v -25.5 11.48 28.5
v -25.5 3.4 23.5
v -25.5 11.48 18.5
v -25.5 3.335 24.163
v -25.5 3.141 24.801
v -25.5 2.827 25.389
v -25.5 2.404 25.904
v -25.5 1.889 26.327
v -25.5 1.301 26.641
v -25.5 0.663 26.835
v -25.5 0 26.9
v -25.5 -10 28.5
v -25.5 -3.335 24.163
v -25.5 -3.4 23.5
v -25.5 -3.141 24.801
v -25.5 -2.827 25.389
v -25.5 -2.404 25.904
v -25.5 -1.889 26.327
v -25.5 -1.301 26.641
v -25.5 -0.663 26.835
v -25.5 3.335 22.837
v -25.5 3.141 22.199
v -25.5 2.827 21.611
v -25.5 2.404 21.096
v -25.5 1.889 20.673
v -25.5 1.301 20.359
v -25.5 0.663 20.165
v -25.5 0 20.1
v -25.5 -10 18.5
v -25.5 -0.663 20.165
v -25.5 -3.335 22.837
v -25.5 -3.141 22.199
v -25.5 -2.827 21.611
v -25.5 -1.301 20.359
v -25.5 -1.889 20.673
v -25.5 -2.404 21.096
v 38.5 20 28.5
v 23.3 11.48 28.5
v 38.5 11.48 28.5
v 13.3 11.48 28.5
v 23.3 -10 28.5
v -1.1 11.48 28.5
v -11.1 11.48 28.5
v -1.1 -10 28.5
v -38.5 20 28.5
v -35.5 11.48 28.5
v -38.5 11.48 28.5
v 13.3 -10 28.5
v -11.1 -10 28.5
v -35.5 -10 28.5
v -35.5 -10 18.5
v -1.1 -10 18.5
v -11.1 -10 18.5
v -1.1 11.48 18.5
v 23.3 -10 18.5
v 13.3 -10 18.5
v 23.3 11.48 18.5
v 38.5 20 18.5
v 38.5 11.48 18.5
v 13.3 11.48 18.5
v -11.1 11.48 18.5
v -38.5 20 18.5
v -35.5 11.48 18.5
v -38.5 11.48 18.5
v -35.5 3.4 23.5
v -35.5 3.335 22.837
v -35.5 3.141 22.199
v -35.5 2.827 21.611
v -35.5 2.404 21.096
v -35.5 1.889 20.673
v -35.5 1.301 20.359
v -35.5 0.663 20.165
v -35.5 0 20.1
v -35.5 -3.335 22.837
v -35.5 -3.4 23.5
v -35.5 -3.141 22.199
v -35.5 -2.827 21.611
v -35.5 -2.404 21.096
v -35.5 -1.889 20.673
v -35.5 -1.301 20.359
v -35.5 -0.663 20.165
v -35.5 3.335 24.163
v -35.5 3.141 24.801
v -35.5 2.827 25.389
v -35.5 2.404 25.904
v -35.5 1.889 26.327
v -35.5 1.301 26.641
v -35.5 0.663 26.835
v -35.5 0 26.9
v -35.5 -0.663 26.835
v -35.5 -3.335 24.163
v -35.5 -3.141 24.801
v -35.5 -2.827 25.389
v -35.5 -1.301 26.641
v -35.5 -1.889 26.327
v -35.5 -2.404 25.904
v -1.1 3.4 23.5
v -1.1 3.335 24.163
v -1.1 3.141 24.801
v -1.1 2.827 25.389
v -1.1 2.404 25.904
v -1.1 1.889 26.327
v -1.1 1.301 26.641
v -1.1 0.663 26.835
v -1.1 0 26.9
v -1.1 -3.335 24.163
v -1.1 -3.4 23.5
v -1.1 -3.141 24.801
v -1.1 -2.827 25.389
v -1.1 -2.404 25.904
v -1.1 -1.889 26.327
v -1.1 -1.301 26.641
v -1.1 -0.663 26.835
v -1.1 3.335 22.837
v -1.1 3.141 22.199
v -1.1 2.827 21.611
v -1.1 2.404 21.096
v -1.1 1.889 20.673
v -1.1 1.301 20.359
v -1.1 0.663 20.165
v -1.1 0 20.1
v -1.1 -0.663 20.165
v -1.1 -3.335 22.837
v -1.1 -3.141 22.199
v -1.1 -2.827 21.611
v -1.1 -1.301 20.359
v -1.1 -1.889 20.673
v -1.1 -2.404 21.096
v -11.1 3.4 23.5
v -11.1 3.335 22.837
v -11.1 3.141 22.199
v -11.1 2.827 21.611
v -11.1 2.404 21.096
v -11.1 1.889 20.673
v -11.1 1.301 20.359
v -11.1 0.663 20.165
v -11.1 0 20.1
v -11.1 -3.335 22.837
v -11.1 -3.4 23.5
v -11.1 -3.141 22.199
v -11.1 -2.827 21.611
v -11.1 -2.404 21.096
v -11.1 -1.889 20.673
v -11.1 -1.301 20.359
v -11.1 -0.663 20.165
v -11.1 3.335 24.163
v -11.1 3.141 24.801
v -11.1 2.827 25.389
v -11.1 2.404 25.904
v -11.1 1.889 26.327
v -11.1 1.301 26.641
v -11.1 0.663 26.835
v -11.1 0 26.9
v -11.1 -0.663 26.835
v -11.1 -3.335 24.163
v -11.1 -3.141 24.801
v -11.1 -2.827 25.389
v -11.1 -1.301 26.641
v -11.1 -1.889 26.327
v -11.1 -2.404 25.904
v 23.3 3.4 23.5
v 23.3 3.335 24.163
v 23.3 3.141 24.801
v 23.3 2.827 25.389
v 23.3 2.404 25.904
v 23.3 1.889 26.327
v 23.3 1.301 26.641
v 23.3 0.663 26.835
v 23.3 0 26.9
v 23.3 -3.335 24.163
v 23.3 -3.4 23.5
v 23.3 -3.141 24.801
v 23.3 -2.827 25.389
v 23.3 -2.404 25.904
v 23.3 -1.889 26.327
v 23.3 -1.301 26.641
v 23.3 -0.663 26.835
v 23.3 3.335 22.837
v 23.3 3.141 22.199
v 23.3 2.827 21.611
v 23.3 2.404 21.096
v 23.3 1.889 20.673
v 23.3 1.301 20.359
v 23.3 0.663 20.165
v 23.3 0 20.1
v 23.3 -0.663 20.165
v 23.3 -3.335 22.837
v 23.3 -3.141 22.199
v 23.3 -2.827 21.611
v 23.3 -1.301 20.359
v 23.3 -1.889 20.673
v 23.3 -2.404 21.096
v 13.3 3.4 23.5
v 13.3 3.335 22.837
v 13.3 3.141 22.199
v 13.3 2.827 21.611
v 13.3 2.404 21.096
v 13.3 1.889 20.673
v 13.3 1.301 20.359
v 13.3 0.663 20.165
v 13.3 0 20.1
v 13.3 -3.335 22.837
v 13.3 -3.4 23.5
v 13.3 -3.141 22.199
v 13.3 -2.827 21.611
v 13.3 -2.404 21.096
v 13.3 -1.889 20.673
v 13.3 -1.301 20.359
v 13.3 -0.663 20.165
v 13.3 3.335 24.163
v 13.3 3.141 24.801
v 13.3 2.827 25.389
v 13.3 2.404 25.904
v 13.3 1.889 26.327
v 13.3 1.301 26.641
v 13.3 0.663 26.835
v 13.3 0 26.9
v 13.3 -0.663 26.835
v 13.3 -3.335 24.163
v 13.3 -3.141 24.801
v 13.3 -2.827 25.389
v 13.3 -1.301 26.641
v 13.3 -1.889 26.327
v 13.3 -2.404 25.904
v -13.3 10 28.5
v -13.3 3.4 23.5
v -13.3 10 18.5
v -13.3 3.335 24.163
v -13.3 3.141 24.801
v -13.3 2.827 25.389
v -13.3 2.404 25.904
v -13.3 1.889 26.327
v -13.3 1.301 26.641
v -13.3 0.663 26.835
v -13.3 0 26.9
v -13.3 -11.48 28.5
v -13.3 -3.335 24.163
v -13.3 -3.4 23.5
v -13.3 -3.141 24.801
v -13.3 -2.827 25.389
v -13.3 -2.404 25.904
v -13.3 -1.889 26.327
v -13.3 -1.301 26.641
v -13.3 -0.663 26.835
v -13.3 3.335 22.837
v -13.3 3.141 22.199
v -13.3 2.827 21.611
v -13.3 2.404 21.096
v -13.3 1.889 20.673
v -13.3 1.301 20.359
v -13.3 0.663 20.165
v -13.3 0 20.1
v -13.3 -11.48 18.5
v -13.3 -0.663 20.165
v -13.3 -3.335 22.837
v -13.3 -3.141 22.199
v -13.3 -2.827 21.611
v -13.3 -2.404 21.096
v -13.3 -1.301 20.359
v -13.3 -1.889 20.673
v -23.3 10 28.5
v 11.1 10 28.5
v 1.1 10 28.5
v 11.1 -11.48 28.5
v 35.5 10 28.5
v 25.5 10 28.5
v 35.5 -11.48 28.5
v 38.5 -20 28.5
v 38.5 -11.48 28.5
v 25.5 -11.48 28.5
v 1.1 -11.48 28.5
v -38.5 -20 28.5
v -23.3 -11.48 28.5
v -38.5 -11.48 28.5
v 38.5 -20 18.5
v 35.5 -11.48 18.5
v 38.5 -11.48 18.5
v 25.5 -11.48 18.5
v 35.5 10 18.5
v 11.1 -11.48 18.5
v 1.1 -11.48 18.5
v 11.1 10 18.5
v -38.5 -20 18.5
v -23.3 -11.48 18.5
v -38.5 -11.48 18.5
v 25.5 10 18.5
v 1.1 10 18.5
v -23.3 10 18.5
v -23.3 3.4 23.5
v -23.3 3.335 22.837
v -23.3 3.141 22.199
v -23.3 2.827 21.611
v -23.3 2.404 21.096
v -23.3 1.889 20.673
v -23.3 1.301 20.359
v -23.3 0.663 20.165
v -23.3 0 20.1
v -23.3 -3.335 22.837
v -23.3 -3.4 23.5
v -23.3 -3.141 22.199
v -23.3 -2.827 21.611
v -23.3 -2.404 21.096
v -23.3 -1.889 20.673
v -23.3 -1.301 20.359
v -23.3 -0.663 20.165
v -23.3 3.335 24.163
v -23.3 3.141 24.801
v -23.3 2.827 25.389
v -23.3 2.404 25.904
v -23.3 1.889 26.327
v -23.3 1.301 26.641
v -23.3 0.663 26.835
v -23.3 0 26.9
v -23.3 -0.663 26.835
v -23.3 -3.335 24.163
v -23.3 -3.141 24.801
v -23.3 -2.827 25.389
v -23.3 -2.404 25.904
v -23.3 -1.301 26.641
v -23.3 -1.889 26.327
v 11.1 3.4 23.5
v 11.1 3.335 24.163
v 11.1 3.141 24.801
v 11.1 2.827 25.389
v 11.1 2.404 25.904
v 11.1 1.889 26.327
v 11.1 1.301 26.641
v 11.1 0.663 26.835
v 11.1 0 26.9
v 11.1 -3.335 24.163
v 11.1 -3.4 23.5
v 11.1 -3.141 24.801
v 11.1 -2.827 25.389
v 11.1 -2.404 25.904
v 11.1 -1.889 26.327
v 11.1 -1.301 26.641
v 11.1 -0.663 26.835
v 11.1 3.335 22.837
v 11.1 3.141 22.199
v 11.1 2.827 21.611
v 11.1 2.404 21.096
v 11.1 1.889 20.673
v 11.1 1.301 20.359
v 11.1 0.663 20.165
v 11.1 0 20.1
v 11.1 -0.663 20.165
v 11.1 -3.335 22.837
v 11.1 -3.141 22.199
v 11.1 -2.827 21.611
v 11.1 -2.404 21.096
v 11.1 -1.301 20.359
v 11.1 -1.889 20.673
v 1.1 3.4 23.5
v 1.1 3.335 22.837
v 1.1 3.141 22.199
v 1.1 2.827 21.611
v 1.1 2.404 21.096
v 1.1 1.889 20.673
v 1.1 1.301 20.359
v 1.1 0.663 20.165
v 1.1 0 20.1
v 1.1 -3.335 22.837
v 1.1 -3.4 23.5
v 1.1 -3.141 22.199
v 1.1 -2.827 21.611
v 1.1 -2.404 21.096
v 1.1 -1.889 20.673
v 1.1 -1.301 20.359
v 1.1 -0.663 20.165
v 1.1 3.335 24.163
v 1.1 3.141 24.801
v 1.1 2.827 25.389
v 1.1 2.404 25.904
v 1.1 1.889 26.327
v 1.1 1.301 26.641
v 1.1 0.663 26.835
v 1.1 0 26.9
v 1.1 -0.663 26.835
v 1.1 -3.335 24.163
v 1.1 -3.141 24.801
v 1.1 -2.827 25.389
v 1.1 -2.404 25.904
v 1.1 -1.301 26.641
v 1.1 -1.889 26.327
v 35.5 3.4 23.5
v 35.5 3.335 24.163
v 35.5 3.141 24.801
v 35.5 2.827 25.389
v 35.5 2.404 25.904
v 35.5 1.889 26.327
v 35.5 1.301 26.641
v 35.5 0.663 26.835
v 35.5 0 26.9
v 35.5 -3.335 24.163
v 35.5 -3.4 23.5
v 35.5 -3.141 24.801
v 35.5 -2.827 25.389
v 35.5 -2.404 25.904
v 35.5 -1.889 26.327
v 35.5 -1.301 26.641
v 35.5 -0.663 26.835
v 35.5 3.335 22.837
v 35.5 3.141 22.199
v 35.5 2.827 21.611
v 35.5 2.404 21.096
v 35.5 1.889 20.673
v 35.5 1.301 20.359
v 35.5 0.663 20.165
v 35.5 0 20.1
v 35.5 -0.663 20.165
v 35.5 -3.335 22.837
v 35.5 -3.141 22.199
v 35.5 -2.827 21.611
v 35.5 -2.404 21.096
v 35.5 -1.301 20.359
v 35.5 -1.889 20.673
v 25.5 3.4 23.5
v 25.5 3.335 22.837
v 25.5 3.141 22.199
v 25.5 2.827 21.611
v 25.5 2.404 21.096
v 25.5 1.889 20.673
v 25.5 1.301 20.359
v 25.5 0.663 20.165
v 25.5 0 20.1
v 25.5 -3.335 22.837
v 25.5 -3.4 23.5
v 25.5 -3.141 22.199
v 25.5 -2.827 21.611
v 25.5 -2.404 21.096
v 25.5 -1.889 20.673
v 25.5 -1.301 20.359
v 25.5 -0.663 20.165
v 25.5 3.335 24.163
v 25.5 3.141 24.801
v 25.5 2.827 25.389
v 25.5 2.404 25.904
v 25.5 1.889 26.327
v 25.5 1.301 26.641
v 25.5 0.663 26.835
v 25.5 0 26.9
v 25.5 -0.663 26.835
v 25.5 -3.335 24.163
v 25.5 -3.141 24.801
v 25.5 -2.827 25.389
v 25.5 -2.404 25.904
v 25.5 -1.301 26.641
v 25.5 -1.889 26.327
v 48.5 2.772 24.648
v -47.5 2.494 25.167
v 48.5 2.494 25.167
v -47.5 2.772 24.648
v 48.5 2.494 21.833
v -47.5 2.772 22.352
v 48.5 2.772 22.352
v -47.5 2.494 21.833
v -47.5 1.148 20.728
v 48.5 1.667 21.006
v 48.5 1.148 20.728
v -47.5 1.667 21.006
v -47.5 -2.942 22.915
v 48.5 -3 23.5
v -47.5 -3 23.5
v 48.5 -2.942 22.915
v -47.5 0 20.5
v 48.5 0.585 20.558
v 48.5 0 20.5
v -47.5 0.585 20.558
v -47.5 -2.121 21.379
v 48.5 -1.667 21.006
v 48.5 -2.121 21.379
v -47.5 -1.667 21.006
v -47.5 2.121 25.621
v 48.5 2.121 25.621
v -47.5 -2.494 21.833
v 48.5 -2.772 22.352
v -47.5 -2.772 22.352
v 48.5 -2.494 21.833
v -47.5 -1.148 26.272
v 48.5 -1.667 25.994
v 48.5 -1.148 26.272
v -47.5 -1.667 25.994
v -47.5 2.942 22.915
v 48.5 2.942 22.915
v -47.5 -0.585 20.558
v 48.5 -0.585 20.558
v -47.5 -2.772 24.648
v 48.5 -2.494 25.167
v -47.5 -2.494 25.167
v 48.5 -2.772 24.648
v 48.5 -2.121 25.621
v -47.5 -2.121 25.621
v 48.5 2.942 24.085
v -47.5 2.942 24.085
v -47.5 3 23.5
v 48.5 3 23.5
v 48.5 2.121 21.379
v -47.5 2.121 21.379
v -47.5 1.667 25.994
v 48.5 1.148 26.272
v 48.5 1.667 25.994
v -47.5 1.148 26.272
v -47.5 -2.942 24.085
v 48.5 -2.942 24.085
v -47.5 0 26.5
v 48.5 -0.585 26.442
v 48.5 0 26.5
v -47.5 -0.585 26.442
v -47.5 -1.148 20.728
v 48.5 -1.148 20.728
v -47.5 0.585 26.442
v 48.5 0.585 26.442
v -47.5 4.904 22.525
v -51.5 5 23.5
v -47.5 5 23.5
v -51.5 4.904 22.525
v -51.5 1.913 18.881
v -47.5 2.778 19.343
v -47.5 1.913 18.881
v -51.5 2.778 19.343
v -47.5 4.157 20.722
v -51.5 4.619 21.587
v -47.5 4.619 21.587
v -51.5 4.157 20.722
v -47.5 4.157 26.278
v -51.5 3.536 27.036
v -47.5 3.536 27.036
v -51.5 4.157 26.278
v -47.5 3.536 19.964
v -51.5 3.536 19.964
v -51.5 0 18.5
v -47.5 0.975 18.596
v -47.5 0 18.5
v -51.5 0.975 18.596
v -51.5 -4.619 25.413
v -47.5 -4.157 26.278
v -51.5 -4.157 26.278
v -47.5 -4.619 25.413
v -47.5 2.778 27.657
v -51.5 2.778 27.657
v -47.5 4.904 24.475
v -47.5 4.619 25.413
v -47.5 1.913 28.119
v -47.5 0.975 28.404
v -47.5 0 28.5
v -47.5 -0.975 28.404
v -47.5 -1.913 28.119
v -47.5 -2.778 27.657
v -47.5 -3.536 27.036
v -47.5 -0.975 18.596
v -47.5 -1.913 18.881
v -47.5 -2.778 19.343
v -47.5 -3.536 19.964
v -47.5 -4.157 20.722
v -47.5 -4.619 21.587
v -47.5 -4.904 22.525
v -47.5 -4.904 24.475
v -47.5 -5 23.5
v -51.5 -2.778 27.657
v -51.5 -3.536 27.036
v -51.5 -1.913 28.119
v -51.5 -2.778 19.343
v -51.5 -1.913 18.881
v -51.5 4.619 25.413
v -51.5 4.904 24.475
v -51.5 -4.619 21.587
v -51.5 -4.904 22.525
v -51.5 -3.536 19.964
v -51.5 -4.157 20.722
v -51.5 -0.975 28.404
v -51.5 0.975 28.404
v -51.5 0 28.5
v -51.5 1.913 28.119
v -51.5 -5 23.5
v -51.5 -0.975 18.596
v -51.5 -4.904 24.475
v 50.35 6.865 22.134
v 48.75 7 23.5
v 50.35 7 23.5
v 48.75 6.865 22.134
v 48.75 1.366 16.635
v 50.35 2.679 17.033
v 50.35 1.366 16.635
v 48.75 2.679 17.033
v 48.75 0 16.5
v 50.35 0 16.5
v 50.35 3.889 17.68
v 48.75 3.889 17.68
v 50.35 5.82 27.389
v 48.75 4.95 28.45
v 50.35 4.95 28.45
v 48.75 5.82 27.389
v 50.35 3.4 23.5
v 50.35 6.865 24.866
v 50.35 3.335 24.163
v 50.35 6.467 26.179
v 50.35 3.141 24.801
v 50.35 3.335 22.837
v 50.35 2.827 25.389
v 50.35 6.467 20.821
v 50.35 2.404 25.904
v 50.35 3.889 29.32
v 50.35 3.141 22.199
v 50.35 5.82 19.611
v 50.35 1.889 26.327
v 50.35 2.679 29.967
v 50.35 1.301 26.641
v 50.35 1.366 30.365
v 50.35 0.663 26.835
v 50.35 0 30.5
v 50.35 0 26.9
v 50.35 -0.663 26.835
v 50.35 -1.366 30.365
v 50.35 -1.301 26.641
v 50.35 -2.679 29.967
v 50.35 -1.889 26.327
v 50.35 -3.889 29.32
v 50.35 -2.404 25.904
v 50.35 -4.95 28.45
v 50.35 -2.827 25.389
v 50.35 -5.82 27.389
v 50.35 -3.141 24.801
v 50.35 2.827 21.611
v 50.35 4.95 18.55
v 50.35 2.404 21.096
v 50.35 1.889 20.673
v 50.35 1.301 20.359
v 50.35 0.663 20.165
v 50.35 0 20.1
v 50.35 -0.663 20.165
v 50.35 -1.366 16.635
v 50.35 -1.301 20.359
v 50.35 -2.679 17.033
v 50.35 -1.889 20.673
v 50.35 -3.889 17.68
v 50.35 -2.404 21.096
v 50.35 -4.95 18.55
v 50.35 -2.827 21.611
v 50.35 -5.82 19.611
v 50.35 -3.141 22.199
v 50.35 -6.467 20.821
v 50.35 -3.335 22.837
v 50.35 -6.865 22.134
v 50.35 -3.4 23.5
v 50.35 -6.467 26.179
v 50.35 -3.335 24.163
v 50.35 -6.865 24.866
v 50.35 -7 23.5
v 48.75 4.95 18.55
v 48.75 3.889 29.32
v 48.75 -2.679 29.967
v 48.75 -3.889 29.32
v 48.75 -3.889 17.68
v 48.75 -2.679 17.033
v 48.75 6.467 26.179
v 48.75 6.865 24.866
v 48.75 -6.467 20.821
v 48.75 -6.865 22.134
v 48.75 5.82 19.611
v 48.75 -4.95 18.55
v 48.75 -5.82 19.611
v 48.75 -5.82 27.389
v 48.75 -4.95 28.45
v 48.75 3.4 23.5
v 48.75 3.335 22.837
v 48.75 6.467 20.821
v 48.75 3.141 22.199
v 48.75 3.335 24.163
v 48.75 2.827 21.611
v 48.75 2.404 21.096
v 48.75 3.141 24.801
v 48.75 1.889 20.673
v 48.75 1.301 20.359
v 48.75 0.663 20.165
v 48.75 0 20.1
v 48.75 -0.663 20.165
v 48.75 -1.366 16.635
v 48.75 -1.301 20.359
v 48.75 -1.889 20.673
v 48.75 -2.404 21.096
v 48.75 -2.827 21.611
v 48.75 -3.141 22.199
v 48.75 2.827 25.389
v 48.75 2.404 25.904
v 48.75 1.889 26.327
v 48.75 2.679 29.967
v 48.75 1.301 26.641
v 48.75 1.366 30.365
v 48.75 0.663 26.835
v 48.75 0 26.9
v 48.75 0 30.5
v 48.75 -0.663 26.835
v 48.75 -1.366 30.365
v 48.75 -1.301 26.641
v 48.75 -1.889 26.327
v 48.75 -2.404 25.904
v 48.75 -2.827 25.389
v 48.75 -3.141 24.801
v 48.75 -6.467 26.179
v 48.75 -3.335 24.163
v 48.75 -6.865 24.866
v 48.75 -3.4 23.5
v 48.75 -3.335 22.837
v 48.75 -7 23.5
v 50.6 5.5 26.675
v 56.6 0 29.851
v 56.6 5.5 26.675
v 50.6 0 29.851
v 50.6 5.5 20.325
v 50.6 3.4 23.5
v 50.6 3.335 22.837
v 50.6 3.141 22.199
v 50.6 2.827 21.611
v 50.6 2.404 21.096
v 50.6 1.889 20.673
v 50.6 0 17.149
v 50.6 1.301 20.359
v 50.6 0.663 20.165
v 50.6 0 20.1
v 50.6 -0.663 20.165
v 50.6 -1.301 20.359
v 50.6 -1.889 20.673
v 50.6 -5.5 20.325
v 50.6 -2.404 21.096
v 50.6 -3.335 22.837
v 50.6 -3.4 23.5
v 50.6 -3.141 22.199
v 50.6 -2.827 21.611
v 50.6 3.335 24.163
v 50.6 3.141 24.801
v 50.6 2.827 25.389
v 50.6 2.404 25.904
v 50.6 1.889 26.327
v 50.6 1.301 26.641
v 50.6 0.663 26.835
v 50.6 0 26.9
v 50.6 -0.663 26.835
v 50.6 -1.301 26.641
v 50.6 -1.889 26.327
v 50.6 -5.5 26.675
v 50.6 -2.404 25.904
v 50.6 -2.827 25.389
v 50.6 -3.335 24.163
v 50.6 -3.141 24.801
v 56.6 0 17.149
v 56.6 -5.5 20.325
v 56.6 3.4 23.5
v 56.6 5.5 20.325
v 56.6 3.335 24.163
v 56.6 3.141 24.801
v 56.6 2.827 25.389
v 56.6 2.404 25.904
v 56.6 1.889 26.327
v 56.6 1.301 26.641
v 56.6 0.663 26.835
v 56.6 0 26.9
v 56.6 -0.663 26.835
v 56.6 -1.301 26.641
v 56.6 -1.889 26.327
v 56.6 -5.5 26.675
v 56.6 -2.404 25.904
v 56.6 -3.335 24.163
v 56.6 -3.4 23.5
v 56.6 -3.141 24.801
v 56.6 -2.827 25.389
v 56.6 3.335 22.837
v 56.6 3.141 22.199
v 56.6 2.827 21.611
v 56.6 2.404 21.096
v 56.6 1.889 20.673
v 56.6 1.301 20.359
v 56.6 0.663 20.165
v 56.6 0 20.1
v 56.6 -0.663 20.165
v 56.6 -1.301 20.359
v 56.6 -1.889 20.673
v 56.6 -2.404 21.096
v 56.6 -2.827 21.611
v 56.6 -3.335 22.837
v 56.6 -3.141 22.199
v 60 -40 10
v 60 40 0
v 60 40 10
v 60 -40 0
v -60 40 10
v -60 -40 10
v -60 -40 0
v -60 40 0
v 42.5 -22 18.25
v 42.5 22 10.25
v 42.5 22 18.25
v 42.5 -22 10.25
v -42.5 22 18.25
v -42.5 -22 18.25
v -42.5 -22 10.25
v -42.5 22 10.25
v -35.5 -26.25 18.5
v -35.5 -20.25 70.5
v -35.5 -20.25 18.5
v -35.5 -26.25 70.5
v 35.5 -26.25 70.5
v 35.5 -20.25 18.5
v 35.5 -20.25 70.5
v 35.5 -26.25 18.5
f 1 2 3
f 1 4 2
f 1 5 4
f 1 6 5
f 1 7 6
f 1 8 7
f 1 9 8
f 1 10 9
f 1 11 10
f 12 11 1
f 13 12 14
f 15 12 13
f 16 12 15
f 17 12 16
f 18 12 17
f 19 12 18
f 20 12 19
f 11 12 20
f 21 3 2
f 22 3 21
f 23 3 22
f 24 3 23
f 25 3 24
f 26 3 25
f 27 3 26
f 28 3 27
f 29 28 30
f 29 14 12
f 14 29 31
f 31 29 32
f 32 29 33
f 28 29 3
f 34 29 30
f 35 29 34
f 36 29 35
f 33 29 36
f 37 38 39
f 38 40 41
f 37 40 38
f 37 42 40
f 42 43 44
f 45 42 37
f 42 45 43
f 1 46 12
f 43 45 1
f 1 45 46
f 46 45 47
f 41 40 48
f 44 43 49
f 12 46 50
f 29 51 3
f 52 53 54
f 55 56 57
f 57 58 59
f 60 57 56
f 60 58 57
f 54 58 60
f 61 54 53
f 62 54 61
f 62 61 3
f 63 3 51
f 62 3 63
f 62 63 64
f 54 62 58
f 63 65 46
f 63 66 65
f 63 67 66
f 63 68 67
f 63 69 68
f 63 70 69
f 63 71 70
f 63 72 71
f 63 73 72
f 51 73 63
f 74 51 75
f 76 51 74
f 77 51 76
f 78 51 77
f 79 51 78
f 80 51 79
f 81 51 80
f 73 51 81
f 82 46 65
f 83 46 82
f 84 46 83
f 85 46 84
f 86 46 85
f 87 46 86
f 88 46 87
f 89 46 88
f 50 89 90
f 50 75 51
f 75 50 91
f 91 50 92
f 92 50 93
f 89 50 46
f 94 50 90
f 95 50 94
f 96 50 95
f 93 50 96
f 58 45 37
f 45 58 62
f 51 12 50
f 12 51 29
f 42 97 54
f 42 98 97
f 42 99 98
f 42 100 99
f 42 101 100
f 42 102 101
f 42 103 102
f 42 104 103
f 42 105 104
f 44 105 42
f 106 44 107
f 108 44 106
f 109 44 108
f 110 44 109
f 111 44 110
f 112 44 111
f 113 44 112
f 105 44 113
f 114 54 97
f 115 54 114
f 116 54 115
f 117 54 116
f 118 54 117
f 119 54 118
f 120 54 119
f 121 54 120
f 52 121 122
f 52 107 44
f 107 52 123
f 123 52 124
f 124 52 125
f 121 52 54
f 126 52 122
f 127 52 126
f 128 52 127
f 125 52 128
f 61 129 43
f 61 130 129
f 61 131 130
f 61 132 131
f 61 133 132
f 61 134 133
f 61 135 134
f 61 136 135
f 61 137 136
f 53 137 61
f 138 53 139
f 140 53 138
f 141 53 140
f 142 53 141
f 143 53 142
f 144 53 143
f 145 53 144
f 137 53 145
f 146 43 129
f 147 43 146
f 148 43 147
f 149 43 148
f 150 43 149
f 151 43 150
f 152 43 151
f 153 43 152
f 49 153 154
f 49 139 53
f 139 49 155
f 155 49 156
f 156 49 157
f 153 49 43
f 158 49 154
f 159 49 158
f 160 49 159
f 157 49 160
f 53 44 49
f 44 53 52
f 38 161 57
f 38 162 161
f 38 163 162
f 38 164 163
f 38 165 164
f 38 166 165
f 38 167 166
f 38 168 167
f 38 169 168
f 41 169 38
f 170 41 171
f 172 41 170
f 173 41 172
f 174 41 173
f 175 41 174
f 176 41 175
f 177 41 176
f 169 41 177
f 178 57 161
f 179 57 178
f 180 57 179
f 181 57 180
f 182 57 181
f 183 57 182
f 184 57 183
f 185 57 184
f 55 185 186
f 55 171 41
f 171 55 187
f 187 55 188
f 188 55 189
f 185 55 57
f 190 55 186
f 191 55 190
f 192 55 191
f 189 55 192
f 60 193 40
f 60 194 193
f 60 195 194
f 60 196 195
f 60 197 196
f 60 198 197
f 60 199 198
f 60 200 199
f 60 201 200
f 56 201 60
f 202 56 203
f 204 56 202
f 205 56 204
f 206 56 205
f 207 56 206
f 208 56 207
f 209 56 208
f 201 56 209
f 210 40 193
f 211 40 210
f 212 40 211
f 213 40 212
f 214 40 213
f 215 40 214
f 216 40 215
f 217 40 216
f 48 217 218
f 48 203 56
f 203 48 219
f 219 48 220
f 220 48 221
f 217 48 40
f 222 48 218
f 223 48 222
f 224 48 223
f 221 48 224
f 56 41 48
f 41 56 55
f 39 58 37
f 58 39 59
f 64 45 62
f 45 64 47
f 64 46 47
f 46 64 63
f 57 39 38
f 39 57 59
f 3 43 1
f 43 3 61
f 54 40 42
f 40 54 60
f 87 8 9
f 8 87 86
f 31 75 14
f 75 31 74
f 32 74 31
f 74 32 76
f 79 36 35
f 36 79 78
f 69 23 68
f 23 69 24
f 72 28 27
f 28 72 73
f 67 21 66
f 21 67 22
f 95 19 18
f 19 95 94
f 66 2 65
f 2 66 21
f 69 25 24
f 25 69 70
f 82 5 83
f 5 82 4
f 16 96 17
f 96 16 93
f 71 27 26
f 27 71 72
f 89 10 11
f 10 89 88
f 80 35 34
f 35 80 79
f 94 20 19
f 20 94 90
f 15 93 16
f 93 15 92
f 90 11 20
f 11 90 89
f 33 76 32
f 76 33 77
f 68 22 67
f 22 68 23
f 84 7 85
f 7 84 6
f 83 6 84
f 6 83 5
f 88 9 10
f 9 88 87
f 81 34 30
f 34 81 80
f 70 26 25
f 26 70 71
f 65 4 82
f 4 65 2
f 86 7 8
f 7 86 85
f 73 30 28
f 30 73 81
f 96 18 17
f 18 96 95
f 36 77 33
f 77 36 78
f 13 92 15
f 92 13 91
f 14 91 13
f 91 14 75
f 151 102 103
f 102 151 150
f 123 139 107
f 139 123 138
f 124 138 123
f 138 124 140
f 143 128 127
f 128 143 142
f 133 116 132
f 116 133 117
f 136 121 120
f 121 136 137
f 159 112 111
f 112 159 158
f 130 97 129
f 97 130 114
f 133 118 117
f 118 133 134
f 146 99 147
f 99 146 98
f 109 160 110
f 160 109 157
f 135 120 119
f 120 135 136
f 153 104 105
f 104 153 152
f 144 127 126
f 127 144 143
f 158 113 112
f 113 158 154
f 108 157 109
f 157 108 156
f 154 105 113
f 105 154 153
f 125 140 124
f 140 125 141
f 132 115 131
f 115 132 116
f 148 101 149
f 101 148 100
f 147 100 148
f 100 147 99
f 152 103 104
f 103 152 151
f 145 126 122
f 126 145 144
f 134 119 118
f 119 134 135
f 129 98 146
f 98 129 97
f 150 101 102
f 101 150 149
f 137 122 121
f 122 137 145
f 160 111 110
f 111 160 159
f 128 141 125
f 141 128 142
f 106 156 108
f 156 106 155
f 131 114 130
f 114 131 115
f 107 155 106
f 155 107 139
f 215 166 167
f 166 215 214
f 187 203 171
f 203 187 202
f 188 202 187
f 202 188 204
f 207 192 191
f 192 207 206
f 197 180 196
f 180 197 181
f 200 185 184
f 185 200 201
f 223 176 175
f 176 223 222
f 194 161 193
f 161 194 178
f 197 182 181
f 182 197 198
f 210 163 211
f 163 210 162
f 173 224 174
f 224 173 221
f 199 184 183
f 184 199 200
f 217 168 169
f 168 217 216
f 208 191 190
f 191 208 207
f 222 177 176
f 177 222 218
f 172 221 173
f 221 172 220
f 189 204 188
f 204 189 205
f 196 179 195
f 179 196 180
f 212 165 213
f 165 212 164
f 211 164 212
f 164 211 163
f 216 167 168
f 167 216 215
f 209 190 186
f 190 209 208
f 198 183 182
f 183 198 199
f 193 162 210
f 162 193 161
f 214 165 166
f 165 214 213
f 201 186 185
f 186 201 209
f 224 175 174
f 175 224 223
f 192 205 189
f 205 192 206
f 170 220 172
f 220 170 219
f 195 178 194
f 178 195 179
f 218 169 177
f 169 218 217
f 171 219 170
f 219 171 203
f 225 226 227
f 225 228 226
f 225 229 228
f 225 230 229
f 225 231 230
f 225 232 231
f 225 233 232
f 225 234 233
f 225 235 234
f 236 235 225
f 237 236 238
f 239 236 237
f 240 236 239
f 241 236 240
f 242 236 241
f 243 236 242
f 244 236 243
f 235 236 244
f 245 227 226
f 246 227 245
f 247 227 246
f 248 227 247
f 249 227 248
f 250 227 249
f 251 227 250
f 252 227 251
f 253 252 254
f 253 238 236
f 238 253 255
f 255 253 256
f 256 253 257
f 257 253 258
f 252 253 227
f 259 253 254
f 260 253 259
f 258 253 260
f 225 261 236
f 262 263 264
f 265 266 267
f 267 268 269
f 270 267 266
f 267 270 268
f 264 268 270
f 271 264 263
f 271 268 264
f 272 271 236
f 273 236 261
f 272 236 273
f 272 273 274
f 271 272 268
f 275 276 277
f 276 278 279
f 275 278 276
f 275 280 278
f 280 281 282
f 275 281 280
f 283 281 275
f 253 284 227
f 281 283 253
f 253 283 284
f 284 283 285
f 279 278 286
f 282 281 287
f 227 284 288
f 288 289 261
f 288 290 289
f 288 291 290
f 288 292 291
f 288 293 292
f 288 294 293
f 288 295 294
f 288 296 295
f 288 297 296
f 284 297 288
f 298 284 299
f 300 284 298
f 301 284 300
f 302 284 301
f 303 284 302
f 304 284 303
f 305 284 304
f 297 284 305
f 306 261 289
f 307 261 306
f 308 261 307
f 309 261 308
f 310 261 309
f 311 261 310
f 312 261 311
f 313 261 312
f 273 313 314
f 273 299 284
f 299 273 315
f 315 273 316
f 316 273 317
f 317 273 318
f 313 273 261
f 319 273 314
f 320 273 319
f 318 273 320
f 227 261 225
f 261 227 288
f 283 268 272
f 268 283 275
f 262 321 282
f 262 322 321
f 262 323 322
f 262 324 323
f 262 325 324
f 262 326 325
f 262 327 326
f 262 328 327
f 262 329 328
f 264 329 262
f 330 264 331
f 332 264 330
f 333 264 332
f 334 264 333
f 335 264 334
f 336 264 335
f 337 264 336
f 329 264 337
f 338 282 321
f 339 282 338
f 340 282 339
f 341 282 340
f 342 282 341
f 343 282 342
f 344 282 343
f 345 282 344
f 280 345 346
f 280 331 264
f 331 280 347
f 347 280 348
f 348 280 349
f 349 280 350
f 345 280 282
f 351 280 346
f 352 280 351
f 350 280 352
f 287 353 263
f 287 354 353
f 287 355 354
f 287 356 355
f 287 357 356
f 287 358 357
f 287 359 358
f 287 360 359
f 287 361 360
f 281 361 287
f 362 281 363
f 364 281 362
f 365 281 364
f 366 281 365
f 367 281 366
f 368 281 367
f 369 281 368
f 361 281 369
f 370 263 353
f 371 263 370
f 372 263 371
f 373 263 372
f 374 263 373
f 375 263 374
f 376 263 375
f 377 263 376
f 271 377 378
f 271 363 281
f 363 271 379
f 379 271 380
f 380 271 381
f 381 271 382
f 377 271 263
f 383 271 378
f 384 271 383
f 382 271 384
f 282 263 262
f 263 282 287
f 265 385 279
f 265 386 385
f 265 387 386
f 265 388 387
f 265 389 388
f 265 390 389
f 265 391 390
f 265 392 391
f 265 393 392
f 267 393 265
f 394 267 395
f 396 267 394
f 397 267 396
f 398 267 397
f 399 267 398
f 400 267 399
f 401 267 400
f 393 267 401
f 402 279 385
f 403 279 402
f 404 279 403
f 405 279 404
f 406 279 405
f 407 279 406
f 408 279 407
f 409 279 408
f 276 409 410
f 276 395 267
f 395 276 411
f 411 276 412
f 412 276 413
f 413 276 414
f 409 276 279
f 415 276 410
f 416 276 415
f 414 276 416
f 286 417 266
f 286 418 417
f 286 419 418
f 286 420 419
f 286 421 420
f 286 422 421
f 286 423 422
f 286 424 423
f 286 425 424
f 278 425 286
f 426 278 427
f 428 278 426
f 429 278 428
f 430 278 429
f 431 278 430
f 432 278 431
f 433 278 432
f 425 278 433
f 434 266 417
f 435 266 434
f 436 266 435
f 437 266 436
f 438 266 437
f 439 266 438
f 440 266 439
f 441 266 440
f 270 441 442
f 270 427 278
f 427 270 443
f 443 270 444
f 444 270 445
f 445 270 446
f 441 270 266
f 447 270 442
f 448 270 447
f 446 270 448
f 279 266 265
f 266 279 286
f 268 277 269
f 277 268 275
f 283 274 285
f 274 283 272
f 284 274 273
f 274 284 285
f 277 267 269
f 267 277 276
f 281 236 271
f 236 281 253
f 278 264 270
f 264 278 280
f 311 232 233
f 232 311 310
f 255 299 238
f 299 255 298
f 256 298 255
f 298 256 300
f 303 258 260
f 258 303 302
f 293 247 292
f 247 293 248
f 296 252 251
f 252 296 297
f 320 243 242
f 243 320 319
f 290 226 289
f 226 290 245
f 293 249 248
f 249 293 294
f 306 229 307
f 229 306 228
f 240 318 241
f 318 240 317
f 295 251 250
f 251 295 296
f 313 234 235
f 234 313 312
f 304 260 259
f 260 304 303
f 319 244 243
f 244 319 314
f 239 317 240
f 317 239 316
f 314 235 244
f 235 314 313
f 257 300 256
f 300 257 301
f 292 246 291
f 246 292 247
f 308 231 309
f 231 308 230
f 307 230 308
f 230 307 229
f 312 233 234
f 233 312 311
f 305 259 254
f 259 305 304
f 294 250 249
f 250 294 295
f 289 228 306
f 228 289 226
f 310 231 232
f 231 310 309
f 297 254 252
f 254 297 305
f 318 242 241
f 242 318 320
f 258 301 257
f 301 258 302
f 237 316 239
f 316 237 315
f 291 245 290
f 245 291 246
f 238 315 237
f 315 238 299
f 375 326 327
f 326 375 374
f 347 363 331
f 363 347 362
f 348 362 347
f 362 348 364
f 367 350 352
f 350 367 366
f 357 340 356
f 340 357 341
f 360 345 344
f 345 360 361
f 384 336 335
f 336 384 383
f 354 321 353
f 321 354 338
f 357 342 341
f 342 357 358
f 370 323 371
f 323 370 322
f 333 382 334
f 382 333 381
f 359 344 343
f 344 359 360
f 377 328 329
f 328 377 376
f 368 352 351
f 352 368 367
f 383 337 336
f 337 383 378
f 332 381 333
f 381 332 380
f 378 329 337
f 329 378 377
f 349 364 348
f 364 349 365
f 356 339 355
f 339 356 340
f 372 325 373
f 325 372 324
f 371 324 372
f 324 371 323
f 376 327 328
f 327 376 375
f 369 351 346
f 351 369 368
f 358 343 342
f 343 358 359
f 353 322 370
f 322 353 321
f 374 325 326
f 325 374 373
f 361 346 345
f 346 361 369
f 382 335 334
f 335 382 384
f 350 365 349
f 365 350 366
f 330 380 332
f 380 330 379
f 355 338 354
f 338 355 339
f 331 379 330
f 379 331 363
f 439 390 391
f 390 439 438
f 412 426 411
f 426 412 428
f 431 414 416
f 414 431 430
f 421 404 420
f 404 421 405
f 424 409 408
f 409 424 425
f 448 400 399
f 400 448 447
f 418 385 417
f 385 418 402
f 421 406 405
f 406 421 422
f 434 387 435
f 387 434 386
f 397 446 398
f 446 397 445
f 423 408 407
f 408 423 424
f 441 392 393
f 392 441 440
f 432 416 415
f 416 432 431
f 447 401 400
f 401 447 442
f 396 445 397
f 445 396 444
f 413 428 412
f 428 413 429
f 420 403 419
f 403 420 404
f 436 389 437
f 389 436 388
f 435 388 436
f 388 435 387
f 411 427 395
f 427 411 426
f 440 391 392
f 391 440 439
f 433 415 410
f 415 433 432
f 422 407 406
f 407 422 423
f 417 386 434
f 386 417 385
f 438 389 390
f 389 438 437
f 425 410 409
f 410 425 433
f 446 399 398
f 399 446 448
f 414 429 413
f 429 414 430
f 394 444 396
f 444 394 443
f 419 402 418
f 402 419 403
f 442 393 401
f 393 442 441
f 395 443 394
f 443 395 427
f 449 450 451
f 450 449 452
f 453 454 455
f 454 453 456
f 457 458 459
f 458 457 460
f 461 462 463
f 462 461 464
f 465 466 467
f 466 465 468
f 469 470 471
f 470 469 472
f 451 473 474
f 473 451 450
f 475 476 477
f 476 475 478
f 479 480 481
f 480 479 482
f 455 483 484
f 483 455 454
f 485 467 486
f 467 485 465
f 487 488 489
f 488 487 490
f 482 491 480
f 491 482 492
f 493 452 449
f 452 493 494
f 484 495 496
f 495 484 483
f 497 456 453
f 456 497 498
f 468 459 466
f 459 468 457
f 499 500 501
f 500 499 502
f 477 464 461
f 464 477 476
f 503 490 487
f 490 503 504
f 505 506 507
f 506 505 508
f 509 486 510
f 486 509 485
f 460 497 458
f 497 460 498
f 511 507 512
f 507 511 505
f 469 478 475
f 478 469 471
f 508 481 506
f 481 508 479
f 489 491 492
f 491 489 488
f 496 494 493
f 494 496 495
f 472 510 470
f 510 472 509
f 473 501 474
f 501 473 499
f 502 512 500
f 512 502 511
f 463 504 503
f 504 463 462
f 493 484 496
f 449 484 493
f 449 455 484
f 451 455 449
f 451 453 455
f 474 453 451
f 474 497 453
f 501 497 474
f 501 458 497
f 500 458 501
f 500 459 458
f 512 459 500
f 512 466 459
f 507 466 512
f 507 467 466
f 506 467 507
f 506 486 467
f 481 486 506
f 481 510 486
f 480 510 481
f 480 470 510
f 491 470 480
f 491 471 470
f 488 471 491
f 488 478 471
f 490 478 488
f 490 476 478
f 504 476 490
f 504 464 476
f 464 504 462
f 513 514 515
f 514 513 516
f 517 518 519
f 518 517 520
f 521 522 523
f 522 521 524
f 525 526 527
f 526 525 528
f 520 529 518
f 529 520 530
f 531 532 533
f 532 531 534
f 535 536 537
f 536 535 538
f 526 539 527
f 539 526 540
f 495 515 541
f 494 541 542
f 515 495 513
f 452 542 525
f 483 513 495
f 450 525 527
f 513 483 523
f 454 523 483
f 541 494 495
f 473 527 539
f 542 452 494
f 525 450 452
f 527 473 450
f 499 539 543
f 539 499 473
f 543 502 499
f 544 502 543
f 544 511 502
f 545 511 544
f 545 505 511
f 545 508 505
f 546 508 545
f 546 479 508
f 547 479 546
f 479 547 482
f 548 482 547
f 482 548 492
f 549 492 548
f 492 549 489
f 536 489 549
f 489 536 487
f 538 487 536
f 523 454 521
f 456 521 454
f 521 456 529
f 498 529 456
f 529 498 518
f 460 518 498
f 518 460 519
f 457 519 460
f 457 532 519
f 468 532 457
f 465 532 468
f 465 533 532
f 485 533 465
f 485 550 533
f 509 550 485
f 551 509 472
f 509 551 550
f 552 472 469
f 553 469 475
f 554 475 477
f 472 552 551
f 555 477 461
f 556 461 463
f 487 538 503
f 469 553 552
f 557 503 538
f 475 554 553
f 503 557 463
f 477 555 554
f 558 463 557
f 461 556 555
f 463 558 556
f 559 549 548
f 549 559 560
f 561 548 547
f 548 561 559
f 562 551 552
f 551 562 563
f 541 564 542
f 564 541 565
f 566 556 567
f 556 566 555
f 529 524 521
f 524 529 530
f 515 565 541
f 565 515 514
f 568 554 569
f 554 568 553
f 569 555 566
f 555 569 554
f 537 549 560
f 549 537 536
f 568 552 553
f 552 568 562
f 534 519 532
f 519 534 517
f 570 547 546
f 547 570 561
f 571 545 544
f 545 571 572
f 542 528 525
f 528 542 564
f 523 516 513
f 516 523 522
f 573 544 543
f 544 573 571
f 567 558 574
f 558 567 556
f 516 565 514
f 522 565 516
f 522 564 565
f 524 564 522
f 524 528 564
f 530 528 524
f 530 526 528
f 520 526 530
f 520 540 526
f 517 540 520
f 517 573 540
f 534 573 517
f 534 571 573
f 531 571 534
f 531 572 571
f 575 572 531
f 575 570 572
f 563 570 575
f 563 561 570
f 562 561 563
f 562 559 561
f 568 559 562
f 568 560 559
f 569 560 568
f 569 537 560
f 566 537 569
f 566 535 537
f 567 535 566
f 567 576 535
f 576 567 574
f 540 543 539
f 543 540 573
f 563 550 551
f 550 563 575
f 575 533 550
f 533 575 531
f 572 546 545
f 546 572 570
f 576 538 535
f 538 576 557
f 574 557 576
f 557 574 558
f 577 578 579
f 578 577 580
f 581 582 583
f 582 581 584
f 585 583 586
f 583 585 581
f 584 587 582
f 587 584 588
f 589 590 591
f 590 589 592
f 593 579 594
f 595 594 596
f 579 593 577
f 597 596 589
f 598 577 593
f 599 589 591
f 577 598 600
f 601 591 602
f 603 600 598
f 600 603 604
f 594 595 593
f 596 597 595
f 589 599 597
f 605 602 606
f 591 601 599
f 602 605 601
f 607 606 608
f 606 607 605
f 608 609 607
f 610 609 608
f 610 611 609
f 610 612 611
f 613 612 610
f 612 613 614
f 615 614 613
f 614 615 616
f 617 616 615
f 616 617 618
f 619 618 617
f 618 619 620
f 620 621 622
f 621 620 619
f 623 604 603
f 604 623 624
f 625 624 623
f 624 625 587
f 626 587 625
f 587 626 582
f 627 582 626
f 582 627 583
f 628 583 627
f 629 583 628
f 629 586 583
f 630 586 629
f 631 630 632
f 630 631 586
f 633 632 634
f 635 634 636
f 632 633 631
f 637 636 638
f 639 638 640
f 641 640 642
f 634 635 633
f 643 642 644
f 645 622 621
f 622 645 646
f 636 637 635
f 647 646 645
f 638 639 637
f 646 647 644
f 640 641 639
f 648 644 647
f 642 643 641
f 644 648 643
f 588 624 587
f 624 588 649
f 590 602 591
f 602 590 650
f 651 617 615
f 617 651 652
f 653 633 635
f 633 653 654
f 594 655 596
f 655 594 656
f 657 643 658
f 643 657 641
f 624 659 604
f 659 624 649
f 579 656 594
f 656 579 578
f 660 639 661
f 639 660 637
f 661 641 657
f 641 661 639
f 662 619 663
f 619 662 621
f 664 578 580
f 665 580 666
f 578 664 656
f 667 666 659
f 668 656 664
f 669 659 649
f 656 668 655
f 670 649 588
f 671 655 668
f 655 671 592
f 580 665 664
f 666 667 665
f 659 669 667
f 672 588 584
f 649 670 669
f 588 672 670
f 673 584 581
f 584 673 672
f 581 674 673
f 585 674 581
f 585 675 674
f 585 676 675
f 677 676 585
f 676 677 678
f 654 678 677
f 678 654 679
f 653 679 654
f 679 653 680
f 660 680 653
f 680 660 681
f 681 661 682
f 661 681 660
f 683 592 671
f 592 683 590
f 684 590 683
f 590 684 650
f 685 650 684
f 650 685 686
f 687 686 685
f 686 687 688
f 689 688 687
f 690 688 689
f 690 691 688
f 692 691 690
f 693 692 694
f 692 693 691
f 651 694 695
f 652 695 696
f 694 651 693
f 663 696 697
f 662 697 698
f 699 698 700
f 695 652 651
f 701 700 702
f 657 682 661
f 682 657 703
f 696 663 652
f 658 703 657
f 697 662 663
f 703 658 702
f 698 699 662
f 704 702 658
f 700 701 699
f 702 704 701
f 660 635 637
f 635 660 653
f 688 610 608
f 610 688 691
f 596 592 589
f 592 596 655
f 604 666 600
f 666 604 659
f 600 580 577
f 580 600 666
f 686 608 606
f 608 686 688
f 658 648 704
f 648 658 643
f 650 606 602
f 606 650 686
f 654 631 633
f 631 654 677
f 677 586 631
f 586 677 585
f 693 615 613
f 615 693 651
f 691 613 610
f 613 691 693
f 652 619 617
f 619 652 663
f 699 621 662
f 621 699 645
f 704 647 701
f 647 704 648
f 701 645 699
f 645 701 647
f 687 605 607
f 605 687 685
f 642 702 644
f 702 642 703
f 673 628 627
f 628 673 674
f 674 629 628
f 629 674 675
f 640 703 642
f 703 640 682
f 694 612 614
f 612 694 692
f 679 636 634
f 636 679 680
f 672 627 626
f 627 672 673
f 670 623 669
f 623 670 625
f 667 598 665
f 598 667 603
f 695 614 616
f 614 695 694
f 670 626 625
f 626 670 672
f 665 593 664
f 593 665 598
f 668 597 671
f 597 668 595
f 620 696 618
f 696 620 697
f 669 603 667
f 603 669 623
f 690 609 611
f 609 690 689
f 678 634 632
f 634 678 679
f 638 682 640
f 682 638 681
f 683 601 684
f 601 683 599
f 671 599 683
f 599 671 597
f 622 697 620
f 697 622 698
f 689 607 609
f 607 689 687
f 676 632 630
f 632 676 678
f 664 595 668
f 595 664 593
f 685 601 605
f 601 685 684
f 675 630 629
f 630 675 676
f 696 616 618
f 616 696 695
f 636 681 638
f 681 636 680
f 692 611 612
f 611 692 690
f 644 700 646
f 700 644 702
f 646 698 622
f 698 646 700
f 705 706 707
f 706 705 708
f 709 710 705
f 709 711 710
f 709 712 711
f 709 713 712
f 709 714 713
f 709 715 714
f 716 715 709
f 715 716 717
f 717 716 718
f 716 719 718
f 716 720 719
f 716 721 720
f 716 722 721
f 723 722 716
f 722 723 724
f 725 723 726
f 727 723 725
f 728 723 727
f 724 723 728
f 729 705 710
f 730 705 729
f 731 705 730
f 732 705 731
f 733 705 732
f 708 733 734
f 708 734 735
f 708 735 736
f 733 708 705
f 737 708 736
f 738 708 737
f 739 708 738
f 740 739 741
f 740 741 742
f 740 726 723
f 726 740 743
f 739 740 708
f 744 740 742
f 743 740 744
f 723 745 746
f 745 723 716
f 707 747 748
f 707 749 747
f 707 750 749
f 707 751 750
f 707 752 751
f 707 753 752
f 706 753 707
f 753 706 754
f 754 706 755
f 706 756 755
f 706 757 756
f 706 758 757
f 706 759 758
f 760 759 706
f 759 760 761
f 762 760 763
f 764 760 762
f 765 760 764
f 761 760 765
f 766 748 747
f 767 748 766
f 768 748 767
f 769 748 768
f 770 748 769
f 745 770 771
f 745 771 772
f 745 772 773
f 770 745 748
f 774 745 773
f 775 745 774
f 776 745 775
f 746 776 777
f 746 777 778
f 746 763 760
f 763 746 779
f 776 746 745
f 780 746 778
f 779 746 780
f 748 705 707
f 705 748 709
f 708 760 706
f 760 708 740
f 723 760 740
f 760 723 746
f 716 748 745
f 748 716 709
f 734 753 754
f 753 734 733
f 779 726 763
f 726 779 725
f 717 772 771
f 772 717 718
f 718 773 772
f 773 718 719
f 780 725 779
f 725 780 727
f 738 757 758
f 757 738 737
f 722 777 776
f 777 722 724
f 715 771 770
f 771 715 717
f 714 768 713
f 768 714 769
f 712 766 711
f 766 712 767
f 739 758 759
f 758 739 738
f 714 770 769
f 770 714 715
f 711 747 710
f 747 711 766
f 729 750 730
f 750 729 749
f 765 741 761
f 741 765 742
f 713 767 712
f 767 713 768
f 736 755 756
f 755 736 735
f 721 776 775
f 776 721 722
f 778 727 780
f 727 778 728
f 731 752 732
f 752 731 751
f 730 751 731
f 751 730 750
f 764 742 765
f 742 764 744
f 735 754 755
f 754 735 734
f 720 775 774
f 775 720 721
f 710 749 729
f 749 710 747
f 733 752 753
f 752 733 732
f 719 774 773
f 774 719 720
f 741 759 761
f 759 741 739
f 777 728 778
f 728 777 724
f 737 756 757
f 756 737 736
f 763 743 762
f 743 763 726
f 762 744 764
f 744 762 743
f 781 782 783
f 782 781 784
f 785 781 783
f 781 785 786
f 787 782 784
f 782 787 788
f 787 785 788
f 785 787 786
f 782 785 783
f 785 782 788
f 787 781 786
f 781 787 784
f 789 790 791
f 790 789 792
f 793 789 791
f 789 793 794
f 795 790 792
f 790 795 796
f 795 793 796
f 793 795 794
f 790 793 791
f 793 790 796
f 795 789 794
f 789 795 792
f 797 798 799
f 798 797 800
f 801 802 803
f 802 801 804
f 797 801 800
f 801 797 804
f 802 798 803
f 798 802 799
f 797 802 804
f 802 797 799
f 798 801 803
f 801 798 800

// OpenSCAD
$fn = 32;

// ------------------------------------------------------------------------
// Comb hinge with flap: leaf 77 x 20 mm, pin d6, flap 52 mm
// Every part is its own module, assembly() places every instance.
// ------------------------------------------------------------------------

// --- part 1 ---
module hinge_bed() {
  difference() {
    translate([-60, -40, 0]) cube([120, 80, 10]);
  }
}

// --- part 2 ---
module hinge_riser() {
  difference() {
    translate([-42.5, -22, 0]) cube([85, 44, 8]);
  }
}

// --- part 3 ---
module hinge_leaf_a() {
  difference() {
    union() {
      translate([-35.5, -10, -5]) cube([10, 30, 10]);
      translate([-11.1, -10, -5]) cube([10, 30, 10]);
      translate([13.3, -10, -5]) cube([10, 30, 10]);
      translate([-38.5, 11.48, -5]) cube([77, 8.52, 10]);
    }
    translate([-30.5, 0, 0]) rotate([0, 90, 0]) cylinder(h = 12, d = 6.8, center = true);
    translate([-6.1, 0, 0]) rotate([0, 90, 0]) cylinder(h = 12, d = 6.8, center = true);
    translate([18.3, 0, 0]) rotate([0, 90, 0]) cylinder(h = 12, d = 6.8, center = true);
  }
}

// --- part 4 ---
module hinge_leaf_b() {
  difference() {
    union() {
      translate([-23.3, -20, -5]) cube([10, 30, 10]);
      translate([1.1, -20, -5]) cube([10, 30, 10]);
      translate([25.5, -20, -5]) cube([10, 30, 10]);
      translate([-38.5, -20, -5]) cube([77, 8.52, 10]);
    }
    translate([-18.3, 0, 0]) rotate([0, 90, 0]) cylinder(h = 12, d = 6.8, center = true);
    translate([6.1, 0, 0]) rotate([0, 90, 0]) cylinder(h = 12, d = 6.8, center = true);
    translate([30.5, 0, 0]) rotate([0, 90, 0]) cylinder(h = 12, d = 6.8, center = true);
  }
}

// --- part 5 ---
module hinge_flap() {
  difference() {
    translate([-35.5, -26, 0]) cube([71, 52, 6]);
  }
}

// --- part 6 ---
module hinge_pin() {
  rotate([0, 90, 0]) cylinder(h = 97, d = 6, center = true);
  translate([-51.5, 0, 0]) rotate([0, 90, 0]) cylinder(h = 4, d = 10);
}

// --- part 7 ---
module pin_washer() {
  difference() {
      translate([0, 0, 0]) cylinder(h = 1.6, d = 14);
      translate([0, 0, -1]) cylinder(h = 3.6, d = 6.8);
    }
}

// --- part 8 ---
module pin_nut() {
  difference() {
    linear_extrude(height = 6) polygon(points = [[6.351, 0], [3.175, 5.5], [-3.175, 5.5], [-6.351, 0], [-3.175, -5.5], [3.175, -5.5]]);
    translate([0, 0, -1]) cylinder(h = 8, d = 6.8);
  }
}

// --- assembly ---
module assembly() {
  color([0.80, 0.24, 0.20]) translate([0, 0, 0]) rotate([0, 0, 0]) hinge_bed();
  color([0.20, 0.45, 0.75]) translate([0, 0, 10.25]) rotate([0, 0, 0]) hinge_riser();
  color([0.25, 0.62, 0.32]) translate([0, 0, 23.5]) rotate([0, 0, 0]) hinge_leaf_a();
  color([0.92, 0.70, 0.18]) translate([0, 0, 23.5]) rotate([0, 0, 0]) hinge_leaf_b();
  color([0.58, 0.35, 0.70]) translate([0, -20.25, 44.5]) rotate([90, 0, 0]) hinge_flap();
  color([0.16, 0.66, 0.66]) translate([0, 0, 23.5]) rotate([0, 0, 0]) hinge_pin();
  color([0.85, 0.48, 0.18]) translate([48.75, 0, 23.5]) rotate([0, 90, 0]) pin_washer();
  color([0.55, 0.60, 0.65]) translate([50.6, 0, 23.5]) rotate([0, 90, 0]) pin_nut();
}

assembly();
